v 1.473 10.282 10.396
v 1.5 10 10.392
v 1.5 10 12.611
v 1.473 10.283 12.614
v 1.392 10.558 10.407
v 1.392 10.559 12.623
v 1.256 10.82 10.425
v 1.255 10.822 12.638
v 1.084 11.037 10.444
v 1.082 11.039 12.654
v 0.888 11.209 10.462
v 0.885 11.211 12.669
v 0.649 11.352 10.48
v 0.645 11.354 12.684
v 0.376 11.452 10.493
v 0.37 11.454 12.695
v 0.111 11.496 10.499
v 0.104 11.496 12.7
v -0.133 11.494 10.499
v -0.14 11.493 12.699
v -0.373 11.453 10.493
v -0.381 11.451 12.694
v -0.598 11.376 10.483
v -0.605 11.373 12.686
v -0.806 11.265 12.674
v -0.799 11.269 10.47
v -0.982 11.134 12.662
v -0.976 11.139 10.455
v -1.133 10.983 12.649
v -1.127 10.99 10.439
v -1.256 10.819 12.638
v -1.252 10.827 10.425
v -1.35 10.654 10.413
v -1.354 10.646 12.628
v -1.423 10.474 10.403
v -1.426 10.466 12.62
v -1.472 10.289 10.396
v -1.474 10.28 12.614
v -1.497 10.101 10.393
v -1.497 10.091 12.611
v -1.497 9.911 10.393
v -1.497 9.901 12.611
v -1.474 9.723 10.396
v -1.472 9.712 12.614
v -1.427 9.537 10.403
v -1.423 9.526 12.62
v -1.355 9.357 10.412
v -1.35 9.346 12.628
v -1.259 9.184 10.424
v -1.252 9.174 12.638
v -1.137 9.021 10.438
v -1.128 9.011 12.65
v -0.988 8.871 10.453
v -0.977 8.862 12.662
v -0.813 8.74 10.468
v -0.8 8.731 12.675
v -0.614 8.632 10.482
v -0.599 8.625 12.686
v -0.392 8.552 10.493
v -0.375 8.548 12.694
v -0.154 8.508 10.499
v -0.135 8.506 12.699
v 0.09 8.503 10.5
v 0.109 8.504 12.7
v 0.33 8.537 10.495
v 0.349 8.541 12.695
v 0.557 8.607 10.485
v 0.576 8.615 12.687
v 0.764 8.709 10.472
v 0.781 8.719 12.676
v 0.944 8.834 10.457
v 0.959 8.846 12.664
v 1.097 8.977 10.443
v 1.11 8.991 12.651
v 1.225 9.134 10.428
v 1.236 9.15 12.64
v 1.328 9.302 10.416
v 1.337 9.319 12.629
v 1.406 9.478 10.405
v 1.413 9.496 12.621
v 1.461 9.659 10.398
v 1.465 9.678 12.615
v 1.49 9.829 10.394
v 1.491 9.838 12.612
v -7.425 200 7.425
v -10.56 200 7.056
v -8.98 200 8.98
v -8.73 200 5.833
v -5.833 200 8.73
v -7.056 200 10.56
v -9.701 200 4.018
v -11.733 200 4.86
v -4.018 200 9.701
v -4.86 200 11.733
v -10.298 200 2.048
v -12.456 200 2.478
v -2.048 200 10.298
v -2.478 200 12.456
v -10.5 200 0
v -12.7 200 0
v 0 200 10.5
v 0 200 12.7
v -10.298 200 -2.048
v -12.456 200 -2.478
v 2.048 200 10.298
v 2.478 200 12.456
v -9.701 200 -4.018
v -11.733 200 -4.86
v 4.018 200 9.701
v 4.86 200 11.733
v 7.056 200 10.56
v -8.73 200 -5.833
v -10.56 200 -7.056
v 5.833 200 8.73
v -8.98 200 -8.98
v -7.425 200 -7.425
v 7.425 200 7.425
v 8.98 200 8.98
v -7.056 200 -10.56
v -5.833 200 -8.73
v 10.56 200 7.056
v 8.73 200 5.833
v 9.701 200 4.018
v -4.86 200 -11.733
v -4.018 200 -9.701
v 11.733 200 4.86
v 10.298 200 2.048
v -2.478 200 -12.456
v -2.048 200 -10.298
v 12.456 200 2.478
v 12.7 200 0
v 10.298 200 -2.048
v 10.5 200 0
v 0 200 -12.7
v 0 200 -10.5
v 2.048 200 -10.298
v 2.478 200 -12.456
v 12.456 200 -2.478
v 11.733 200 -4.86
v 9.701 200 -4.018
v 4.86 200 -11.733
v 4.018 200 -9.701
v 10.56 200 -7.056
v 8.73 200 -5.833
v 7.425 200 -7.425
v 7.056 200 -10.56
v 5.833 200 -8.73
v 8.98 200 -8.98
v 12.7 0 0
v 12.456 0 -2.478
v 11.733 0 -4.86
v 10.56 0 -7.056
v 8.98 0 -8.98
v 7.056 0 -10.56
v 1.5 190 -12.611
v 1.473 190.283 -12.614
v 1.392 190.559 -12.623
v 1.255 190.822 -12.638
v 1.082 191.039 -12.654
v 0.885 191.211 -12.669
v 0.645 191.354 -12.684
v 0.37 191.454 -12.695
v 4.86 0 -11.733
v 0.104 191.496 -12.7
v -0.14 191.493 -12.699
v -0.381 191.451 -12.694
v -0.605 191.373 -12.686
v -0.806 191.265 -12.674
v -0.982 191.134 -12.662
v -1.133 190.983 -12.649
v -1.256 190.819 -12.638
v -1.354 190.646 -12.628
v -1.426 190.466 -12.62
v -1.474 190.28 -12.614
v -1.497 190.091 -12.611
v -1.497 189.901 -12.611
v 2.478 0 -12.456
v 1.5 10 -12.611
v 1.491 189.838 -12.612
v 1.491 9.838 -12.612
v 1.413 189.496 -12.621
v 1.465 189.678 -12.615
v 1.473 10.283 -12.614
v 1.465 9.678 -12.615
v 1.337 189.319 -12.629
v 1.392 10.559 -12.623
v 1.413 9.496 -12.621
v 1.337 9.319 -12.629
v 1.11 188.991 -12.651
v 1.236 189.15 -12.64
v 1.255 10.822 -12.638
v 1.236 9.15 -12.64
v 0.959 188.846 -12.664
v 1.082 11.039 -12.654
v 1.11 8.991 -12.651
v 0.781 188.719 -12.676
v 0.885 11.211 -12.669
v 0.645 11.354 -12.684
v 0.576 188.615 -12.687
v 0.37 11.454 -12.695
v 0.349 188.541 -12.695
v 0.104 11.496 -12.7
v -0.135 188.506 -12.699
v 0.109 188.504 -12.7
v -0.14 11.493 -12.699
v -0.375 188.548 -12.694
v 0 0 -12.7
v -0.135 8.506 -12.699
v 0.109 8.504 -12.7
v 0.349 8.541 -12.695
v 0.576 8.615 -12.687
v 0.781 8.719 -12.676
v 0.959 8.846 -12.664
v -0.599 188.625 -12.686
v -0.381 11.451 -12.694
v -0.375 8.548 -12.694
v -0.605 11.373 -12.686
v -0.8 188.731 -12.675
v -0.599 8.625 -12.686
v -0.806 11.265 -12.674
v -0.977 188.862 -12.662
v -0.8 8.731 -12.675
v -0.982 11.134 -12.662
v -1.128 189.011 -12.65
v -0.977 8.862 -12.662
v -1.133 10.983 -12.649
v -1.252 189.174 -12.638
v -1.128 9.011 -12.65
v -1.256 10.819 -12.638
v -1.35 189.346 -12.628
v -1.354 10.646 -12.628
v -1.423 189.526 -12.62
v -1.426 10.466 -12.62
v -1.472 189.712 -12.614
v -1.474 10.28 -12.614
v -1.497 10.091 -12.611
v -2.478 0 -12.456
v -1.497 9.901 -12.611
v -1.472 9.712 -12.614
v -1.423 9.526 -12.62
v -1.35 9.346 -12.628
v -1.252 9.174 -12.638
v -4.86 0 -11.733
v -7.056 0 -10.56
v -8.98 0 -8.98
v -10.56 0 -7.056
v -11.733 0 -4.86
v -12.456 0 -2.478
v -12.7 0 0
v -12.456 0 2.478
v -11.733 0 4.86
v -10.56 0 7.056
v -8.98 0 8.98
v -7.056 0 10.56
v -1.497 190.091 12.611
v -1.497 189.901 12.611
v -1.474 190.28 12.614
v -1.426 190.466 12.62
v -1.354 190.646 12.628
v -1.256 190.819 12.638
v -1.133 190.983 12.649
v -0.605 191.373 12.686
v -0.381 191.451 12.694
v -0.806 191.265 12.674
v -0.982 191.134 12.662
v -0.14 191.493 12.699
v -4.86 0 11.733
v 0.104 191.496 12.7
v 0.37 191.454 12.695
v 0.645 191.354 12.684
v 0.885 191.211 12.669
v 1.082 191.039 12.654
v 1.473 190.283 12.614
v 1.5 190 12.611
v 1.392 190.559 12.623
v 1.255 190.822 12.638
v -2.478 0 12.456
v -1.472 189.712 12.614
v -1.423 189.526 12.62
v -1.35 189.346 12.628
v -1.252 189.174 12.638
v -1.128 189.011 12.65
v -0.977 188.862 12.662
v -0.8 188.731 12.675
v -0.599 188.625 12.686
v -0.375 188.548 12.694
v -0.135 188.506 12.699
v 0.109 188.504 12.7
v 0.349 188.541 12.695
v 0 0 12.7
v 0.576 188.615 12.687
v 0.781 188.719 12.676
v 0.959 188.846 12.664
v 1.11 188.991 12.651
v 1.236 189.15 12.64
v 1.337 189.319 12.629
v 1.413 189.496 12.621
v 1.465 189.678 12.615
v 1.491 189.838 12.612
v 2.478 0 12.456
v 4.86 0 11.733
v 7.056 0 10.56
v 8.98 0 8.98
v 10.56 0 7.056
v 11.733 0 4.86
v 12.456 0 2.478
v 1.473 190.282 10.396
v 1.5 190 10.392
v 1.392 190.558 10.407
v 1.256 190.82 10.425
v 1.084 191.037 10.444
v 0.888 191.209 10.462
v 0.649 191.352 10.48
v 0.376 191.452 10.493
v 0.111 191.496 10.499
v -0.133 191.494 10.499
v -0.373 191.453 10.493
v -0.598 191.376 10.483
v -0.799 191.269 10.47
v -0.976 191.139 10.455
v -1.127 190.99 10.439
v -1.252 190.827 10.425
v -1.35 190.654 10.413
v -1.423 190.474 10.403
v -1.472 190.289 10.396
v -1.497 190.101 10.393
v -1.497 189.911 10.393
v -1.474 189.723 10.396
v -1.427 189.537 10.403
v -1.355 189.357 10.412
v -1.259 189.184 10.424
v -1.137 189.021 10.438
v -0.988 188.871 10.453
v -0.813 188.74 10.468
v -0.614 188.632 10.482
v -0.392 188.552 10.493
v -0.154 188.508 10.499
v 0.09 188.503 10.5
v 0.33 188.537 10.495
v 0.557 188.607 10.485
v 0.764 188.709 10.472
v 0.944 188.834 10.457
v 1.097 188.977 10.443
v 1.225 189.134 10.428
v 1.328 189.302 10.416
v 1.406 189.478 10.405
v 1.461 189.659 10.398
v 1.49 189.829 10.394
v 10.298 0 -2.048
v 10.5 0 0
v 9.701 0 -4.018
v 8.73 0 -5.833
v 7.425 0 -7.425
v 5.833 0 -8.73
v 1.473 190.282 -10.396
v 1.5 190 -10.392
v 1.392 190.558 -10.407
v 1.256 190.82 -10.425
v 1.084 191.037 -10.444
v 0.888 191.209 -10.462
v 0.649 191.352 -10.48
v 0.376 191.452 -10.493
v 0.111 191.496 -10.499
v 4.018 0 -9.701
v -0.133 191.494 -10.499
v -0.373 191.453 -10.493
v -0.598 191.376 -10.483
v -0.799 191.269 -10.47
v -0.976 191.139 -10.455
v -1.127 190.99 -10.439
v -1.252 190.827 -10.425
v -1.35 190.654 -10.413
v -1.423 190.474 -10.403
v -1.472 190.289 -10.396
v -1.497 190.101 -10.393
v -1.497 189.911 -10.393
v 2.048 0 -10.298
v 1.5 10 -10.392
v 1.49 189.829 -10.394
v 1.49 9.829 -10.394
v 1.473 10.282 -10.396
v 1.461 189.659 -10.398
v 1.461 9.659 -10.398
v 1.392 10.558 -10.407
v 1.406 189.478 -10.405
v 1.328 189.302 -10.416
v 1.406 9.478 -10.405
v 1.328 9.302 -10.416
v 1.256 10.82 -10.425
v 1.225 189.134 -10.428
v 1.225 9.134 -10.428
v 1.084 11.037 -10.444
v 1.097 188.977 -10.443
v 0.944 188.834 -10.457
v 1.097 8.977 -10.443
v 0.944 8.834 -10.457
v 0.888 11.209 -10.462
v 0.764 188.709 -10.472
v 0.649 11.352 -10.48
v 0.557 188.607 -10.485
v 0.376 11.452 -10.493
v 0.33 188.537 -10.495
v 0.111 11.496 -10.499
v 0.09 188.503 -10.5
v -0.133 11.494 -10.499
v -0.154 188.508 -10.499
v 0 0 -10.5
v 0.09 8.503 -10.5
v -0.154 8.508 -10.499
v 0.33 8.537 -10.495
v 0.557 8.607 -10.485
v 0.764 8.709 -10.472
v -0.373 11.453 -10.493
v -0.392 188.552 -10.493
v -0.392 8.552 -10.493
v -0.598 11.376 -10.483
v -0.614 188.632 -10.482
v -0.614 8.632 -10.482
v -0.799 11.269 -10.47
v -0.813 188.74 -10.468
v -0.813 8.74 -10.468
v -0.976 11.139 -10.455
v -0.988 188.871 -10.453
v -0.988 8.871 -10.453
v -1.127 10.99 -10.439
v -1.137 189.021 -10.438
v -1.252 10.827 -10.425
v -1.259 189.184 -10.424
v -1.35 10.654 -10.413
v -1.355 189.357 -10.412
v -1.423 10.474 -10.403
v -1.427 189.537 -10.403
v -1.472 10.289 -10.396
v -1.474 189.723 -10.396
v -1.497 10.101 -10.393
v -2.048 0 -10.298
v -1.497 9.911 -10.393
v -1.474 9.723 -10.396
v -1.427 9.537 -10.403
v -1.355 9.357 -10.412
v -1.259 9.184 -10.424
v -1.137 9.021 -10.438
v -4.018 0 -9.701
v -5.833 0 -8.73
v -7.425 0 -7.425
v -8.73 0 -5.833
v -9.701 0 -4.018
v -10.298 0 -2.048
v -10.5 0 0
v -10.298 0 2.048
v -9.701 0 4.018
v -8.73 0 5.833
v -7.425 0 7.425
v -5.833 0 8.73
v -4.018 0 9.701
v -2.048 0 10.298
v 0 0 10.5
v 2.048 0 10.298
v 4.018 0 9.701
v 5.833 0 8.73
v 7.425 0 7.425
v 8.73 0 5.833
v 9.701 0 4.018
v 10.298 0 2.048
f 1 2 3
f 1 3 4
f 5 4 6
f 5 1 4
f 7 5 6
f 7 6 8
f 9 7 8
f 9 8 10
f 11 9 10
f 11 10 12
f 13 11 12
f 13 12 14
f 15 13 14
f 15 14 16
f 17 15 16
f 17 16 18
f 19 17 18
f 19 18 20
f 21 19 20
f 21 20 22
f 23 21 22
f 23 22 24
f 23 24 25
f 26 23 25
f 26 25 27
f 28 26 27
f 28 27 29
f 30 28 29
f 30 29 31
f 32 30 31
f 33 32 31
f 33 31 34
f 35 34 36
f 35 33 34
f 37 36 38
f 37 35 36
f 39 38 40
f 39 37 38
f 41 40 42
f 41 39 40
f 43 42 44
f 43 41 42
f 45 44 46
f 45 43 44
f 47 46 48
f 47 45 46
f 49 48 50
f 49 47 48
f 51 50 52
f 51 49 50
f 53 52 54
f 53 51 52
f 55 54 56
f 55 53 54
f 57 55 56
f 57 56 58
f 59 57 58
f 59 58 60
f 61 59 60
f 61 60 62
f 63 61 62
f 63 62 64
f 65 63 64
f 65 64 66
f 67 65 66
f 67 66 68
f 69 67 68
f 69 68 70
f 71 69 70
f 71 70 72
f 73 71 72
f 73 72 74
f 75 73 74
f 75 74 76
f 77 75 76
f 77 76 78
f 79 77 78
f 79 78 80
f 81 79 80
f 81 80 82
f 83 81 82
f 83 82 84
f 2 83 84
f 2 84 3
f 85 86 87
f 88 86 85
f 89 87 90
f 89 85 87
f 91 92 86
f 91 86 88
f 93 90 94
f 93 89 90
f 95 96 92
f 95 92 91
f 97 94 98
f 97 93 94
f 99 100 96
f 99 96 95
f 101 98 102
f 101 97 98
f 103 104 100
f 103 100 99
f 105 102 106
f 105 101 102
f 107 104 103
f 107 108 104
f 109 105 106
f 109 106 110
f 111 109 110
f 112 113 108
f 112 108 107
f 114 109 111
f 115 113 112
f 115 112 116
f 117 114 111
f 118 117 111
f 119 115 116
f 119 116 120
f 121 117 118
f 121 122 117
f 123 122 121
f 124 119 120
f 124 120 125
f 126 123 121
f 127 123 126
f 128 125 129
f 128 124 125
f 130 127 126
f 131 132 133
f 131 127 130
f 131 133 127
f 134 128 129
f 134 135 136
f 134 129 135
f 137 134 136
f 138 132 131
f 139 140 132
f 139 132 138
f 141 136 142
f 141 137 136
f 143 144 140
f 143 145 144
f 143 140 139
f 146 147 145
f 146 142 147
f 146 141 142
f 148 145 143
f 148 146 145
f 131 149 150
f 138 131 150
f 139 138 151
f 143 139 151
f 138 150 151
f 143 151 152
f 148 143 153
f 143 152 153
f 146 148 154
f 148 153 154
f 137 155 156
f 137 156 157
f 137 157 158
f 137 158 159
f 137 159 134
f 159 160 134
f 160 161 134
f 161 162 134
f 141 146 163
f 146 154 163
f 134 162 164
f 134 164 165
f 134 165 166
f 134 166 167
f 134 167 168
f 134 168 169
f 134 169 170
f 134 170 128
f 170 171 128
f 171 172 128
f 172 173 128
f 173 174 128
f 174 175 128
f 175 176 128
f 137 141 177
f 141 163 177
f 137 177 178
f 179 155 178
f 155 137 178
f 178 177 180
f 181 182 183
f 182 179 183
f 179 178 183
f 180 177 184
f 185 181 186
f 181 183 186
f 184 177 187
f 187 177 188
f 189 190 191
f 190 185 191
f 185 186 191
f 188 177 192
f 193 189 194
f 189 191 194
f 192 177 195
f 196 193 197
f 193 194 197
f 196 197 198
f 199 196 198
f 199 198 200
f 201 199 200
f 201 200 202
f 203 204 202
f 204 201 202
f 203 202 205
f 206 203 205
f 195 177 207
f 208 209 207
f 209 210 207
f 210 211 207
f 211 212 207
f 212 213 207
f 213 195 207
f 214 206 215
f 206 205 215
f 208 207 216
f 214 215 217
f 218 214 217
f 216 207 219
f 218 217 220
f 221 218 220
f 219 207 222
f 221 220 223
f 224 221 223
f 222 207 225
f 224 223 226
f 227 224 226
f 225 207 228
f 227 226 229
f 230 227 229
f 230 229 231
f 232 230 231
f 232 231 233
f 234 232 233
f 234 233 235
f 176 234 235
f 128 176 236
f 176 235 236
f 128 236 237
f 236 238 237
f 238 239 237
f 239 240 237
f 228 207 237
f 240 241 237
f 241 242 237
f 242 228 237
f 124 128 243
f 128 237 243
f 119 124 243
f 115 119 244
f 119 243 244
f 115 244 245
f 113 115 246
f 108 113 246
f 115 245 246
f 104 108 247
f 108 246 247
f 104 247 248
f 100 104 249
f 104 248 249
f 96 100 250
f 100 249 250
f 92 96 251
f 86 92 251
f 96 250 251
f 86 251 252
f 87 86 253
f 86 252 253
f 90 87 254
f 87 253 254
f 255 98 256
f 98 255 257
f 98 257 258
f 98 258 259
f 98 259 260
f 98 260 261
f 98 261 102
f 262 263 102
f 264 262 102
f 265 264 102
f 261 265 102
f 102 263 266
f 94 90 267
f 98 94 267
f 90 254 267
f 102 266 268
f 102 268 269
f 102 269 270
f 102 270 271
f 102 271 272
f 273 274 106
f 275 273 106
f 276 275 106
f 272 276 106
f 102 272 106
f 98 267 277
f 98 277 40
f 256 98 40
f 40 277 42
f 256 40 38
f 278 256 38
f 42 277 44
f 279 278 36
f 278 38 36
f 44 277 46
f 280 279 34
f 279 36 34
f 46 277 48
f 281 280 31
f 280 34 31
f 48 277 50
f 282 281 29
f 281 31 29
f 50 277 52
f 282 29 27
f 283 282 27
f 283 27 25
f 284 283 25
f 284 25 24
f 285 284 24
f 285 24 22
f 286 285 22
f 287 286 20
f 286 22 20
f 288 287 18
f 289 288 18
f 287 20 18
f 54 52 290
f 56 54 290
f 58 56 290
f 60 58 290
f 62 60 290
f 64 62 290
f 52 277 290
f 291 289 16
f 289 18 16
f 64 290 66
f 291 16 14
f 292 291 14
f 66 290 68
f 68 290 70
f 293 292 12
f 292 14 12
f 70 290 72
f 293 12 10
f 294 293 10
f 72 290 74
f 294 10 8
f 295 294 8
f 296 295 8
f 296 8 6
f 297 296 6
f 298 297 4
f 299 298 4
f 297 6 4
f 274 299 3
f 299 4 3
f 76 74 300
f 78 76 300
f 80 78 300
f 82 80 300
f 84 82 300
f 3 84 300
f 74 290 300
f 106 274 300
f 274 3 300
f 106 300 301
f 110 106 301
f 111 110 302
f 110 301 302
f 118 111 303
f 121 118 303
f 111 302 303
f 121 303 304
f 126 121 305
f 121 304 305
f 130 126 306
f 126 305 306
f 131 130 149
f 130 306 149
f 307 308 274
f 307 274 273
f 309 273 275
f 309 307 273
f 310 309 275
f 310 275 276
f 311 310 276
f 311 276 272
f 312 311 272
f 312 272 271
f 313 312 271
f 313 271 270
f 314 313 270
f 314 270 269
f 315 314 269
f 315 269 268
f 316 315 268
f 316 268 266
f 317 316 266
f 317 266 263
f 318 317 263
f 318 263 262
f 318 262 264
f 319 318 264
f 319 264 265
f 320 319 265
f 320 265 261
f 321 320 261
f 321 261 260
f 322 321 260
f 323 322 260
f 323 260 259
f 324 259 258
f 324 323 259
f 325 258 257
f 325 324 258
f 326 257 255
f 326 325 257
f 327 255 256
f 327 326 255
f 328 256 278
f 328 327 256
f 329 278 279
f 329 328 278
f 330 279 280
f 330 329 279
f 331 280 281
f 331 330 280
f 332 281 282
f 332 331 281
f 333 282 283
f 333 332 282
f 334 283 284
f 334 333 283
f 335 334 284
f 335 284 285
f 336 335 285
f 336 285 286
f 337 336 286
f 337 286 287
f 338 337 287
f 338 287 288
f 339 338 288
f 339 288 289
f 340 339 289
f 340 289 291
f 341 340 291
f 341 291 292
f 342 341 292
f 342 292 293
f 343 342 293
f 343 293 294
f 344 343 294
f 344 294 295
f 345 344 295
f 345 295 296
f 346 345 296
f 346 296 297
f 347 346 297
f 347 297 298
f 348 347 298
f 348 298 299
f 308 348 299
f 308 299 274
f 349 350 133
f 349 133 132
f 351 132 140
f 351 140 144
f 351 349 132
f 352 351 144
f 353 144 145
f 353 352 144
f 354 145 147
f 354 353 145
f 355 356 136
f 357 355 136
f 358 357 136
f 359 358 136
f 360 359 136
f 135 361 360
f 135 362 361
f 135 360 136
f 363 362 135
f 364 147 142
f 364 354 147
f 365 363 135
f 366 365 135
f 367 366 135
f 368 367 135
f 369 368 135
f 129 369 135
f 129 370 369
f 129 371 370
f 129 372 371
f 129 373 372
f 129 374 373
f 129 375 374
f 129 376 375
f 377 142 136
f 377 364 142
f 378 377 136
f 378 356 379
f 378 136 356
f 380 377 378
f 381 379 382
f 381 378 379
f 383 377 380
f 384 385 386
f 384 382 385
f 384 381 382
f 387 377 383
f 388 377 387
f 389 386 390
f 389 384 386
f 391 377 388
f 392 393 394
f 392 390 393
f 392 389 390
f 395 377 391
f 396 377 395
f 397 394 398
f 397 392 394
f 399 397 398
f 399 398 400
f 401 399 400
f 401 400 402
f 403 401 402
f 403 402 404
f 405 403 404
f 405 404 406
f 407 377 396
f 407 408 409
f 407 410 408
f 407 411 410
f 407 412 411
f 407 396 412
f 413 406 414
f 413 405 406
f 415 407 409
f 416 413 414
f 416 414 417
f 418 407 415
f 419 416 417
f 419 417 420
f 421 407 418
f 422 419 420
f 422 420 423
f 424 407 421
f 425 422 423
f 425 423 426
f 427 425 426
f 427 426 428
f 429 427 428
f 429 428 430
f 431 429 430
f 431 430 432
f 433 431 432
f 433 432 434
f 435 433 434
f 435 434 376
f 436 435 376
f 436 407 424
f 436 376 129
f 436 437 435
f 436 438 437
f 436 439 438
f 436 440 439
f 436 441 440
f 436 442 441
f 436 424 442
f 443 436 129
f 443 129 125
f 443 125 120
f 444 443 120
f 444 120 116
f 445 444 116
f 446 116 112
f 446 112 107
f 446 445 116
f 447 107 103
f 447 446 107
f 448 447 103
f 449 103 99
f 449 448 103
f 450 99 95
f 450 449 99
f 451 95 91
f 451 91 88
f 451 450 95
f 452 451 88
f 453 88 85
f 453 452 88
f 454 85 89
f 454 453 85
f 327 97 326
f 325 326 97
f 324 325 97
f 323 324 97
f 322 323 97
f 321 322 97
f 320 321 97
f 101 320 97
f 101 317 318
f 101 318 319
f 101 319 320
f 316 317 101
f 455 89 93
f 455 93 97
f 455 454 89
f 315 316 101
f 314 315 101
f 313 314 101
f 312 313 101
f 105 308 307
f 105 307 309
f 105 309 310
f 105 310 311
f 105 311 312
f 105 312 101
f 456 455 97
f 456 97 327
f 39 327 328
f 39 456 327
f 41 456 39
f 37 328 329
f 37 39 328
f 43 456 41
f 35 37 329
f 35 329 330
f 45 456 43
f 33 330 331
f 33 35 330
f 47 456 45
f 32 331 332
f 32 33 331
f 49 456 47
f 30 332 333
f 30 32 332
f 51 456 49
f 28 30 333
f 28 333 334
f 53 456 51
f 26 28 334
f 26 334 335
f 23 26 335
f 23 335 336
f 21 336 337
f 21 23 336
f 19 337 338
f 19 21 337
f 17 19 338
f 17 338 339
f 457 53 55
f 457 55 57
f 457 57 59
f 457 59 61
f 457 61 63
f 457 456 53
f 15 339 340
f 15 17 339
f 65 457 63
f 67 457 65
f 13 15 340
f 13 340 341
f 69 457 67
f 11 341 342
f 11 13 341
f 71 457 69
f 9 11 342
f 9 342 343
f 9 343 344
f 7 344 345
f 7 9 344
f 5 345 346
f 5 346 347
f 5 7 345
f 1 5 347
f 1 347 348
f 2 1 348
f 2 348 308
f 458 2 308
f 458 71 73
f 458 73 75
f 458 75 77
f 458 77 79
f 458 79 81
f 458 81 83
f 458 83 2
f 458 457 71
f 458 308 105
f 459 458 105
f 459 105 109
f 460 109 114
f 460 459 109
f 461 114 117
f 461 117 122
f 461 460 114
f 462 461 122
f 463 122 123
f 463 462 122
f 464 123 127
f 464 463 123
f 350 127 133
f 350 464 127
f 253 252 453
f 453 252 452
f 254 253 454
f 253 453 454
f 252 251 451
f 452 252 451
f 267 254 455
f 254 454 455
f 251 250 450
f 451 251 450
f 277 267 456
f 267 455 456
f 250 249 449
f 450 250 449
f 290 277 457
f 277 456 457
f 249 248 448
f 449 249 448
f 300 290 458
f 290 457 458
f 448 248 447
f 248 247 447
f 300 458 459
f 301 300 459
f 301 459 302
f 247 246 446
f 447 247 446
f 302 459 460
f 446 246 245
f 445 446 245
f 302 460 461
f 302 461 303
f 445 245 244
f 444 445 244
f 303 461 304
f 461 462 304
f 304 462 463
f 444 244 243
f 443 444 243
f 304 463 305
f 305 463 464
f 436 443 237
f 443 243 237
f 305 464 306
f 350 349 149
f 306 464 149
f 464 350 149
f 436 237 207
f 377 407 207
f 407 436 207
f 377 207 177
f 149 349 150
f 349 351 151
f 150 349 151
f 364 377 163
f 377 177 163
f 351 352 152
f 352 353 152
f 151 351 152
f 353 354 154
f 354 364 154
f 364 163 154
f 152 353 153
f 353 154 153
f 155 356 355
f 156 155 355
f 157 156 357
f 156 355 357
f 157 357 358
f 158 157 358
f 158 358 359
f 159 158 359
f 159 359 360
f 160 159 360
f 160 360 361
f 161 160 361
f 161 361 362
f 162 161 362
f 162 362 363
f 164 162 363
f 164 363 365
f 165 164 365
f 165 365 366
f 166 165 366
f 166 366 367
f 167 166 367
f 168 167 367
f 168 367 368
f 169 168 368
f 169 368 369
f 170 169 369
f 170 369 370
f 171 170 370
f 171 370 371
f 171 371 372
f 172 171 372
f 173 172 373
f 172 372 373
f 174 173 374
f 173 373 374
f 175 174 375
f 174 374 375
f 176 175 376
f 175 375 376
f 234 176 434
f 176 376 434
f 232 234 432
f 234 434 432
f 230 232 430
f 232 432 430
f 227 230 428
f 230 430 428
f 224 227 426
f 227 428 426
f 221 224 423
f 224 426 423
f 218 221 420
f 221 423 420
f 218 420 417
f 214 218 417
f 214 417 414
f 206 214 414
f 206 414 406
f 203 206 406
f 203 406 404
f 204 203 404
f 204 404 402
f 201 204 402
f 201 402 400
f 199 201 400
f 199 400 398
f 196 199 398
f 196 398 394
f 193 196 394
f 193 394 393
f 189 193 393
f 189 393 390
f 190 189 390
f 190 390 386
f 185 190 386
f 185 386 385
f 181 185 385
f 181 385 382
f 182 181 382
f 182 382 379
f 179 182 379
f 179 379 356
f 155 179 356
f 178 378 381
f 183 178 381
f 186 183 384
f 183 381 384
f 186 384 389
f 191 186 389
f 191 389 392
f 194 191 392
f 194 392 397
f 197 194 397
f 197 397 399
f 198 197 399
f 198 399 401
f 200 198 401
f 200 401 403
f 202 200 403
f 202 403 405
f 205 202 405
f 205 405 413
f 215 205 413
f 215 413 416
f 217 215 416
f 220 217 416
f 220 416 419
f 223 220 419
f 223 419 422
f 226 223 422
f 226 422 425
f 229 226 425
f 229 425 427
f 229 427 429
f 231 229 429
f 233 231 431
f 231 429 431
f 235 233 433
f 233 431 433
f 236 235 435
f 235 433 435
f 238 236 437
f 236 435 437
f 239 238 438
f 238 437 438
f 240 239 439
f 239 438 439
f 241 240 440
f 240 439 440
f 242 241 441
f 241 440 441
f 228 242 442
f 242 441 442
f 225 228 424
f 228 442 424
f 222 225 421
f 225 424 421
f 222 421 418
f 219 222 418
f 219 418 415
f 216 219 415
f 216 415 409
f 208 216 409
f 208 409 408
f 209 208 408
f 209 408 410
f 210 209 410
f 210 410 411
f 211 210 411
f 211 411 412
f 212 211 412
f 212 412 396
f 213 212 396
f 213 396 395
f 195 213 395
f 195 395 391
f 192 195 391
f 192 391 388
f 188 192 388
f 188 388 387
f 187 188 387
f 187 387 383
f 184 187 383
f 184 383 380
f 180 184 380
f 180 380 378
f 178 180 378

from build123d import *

# Parameters (mm, degrees)
CROQUIS1_R                 = 12.7
CROQUIS1_R_2               = 10.5
SALIENTE_EXTRUIR1_DEPTH    = 200
CROQUIS2_R                 = 1.5
CORTAR_EXTRUIR1_DEPTH      = 13.7
CORTAR_EXTRUIR1_DEPTH_BACK = 13.7


with BuildPart() as part:
    # Croquis1 → Saliente-Extruir1 (new body)
    with BuildSketch(Plane(origin=(0, 0, 0), x_dir=(1, 0, 0), z_dir=(0, 1, 0))):
        Circle(CROQUIS1_R)
        Circle(CROQUIS1_R_2, mode=Mode.SUBTRACT)
    extrude(amount=SALIENTE_EXTRUIR1_DEPTH)

    # Croquis2 → Cortar-Extruir1 (cut, two sides)
    with BuildSketch(Plane.XY) as cortar_extruir1_sk:
        with Locations((0, 190)):
            Circle(CROQUIS2_R)
        with Locations((0, 10)):
            Circle(CROQUIS2_R)
    extrude(amount=CORTAR_EXTRUIR1_DEPTH, mode=Mode.SUBTRACT)
    extrude(cortar_extruir1_sk.sketch, amount=-CORTAR_EXTRUIR1_DEPTH_BACK, mode=Mode.SUBTRACT)


solid = part.part
